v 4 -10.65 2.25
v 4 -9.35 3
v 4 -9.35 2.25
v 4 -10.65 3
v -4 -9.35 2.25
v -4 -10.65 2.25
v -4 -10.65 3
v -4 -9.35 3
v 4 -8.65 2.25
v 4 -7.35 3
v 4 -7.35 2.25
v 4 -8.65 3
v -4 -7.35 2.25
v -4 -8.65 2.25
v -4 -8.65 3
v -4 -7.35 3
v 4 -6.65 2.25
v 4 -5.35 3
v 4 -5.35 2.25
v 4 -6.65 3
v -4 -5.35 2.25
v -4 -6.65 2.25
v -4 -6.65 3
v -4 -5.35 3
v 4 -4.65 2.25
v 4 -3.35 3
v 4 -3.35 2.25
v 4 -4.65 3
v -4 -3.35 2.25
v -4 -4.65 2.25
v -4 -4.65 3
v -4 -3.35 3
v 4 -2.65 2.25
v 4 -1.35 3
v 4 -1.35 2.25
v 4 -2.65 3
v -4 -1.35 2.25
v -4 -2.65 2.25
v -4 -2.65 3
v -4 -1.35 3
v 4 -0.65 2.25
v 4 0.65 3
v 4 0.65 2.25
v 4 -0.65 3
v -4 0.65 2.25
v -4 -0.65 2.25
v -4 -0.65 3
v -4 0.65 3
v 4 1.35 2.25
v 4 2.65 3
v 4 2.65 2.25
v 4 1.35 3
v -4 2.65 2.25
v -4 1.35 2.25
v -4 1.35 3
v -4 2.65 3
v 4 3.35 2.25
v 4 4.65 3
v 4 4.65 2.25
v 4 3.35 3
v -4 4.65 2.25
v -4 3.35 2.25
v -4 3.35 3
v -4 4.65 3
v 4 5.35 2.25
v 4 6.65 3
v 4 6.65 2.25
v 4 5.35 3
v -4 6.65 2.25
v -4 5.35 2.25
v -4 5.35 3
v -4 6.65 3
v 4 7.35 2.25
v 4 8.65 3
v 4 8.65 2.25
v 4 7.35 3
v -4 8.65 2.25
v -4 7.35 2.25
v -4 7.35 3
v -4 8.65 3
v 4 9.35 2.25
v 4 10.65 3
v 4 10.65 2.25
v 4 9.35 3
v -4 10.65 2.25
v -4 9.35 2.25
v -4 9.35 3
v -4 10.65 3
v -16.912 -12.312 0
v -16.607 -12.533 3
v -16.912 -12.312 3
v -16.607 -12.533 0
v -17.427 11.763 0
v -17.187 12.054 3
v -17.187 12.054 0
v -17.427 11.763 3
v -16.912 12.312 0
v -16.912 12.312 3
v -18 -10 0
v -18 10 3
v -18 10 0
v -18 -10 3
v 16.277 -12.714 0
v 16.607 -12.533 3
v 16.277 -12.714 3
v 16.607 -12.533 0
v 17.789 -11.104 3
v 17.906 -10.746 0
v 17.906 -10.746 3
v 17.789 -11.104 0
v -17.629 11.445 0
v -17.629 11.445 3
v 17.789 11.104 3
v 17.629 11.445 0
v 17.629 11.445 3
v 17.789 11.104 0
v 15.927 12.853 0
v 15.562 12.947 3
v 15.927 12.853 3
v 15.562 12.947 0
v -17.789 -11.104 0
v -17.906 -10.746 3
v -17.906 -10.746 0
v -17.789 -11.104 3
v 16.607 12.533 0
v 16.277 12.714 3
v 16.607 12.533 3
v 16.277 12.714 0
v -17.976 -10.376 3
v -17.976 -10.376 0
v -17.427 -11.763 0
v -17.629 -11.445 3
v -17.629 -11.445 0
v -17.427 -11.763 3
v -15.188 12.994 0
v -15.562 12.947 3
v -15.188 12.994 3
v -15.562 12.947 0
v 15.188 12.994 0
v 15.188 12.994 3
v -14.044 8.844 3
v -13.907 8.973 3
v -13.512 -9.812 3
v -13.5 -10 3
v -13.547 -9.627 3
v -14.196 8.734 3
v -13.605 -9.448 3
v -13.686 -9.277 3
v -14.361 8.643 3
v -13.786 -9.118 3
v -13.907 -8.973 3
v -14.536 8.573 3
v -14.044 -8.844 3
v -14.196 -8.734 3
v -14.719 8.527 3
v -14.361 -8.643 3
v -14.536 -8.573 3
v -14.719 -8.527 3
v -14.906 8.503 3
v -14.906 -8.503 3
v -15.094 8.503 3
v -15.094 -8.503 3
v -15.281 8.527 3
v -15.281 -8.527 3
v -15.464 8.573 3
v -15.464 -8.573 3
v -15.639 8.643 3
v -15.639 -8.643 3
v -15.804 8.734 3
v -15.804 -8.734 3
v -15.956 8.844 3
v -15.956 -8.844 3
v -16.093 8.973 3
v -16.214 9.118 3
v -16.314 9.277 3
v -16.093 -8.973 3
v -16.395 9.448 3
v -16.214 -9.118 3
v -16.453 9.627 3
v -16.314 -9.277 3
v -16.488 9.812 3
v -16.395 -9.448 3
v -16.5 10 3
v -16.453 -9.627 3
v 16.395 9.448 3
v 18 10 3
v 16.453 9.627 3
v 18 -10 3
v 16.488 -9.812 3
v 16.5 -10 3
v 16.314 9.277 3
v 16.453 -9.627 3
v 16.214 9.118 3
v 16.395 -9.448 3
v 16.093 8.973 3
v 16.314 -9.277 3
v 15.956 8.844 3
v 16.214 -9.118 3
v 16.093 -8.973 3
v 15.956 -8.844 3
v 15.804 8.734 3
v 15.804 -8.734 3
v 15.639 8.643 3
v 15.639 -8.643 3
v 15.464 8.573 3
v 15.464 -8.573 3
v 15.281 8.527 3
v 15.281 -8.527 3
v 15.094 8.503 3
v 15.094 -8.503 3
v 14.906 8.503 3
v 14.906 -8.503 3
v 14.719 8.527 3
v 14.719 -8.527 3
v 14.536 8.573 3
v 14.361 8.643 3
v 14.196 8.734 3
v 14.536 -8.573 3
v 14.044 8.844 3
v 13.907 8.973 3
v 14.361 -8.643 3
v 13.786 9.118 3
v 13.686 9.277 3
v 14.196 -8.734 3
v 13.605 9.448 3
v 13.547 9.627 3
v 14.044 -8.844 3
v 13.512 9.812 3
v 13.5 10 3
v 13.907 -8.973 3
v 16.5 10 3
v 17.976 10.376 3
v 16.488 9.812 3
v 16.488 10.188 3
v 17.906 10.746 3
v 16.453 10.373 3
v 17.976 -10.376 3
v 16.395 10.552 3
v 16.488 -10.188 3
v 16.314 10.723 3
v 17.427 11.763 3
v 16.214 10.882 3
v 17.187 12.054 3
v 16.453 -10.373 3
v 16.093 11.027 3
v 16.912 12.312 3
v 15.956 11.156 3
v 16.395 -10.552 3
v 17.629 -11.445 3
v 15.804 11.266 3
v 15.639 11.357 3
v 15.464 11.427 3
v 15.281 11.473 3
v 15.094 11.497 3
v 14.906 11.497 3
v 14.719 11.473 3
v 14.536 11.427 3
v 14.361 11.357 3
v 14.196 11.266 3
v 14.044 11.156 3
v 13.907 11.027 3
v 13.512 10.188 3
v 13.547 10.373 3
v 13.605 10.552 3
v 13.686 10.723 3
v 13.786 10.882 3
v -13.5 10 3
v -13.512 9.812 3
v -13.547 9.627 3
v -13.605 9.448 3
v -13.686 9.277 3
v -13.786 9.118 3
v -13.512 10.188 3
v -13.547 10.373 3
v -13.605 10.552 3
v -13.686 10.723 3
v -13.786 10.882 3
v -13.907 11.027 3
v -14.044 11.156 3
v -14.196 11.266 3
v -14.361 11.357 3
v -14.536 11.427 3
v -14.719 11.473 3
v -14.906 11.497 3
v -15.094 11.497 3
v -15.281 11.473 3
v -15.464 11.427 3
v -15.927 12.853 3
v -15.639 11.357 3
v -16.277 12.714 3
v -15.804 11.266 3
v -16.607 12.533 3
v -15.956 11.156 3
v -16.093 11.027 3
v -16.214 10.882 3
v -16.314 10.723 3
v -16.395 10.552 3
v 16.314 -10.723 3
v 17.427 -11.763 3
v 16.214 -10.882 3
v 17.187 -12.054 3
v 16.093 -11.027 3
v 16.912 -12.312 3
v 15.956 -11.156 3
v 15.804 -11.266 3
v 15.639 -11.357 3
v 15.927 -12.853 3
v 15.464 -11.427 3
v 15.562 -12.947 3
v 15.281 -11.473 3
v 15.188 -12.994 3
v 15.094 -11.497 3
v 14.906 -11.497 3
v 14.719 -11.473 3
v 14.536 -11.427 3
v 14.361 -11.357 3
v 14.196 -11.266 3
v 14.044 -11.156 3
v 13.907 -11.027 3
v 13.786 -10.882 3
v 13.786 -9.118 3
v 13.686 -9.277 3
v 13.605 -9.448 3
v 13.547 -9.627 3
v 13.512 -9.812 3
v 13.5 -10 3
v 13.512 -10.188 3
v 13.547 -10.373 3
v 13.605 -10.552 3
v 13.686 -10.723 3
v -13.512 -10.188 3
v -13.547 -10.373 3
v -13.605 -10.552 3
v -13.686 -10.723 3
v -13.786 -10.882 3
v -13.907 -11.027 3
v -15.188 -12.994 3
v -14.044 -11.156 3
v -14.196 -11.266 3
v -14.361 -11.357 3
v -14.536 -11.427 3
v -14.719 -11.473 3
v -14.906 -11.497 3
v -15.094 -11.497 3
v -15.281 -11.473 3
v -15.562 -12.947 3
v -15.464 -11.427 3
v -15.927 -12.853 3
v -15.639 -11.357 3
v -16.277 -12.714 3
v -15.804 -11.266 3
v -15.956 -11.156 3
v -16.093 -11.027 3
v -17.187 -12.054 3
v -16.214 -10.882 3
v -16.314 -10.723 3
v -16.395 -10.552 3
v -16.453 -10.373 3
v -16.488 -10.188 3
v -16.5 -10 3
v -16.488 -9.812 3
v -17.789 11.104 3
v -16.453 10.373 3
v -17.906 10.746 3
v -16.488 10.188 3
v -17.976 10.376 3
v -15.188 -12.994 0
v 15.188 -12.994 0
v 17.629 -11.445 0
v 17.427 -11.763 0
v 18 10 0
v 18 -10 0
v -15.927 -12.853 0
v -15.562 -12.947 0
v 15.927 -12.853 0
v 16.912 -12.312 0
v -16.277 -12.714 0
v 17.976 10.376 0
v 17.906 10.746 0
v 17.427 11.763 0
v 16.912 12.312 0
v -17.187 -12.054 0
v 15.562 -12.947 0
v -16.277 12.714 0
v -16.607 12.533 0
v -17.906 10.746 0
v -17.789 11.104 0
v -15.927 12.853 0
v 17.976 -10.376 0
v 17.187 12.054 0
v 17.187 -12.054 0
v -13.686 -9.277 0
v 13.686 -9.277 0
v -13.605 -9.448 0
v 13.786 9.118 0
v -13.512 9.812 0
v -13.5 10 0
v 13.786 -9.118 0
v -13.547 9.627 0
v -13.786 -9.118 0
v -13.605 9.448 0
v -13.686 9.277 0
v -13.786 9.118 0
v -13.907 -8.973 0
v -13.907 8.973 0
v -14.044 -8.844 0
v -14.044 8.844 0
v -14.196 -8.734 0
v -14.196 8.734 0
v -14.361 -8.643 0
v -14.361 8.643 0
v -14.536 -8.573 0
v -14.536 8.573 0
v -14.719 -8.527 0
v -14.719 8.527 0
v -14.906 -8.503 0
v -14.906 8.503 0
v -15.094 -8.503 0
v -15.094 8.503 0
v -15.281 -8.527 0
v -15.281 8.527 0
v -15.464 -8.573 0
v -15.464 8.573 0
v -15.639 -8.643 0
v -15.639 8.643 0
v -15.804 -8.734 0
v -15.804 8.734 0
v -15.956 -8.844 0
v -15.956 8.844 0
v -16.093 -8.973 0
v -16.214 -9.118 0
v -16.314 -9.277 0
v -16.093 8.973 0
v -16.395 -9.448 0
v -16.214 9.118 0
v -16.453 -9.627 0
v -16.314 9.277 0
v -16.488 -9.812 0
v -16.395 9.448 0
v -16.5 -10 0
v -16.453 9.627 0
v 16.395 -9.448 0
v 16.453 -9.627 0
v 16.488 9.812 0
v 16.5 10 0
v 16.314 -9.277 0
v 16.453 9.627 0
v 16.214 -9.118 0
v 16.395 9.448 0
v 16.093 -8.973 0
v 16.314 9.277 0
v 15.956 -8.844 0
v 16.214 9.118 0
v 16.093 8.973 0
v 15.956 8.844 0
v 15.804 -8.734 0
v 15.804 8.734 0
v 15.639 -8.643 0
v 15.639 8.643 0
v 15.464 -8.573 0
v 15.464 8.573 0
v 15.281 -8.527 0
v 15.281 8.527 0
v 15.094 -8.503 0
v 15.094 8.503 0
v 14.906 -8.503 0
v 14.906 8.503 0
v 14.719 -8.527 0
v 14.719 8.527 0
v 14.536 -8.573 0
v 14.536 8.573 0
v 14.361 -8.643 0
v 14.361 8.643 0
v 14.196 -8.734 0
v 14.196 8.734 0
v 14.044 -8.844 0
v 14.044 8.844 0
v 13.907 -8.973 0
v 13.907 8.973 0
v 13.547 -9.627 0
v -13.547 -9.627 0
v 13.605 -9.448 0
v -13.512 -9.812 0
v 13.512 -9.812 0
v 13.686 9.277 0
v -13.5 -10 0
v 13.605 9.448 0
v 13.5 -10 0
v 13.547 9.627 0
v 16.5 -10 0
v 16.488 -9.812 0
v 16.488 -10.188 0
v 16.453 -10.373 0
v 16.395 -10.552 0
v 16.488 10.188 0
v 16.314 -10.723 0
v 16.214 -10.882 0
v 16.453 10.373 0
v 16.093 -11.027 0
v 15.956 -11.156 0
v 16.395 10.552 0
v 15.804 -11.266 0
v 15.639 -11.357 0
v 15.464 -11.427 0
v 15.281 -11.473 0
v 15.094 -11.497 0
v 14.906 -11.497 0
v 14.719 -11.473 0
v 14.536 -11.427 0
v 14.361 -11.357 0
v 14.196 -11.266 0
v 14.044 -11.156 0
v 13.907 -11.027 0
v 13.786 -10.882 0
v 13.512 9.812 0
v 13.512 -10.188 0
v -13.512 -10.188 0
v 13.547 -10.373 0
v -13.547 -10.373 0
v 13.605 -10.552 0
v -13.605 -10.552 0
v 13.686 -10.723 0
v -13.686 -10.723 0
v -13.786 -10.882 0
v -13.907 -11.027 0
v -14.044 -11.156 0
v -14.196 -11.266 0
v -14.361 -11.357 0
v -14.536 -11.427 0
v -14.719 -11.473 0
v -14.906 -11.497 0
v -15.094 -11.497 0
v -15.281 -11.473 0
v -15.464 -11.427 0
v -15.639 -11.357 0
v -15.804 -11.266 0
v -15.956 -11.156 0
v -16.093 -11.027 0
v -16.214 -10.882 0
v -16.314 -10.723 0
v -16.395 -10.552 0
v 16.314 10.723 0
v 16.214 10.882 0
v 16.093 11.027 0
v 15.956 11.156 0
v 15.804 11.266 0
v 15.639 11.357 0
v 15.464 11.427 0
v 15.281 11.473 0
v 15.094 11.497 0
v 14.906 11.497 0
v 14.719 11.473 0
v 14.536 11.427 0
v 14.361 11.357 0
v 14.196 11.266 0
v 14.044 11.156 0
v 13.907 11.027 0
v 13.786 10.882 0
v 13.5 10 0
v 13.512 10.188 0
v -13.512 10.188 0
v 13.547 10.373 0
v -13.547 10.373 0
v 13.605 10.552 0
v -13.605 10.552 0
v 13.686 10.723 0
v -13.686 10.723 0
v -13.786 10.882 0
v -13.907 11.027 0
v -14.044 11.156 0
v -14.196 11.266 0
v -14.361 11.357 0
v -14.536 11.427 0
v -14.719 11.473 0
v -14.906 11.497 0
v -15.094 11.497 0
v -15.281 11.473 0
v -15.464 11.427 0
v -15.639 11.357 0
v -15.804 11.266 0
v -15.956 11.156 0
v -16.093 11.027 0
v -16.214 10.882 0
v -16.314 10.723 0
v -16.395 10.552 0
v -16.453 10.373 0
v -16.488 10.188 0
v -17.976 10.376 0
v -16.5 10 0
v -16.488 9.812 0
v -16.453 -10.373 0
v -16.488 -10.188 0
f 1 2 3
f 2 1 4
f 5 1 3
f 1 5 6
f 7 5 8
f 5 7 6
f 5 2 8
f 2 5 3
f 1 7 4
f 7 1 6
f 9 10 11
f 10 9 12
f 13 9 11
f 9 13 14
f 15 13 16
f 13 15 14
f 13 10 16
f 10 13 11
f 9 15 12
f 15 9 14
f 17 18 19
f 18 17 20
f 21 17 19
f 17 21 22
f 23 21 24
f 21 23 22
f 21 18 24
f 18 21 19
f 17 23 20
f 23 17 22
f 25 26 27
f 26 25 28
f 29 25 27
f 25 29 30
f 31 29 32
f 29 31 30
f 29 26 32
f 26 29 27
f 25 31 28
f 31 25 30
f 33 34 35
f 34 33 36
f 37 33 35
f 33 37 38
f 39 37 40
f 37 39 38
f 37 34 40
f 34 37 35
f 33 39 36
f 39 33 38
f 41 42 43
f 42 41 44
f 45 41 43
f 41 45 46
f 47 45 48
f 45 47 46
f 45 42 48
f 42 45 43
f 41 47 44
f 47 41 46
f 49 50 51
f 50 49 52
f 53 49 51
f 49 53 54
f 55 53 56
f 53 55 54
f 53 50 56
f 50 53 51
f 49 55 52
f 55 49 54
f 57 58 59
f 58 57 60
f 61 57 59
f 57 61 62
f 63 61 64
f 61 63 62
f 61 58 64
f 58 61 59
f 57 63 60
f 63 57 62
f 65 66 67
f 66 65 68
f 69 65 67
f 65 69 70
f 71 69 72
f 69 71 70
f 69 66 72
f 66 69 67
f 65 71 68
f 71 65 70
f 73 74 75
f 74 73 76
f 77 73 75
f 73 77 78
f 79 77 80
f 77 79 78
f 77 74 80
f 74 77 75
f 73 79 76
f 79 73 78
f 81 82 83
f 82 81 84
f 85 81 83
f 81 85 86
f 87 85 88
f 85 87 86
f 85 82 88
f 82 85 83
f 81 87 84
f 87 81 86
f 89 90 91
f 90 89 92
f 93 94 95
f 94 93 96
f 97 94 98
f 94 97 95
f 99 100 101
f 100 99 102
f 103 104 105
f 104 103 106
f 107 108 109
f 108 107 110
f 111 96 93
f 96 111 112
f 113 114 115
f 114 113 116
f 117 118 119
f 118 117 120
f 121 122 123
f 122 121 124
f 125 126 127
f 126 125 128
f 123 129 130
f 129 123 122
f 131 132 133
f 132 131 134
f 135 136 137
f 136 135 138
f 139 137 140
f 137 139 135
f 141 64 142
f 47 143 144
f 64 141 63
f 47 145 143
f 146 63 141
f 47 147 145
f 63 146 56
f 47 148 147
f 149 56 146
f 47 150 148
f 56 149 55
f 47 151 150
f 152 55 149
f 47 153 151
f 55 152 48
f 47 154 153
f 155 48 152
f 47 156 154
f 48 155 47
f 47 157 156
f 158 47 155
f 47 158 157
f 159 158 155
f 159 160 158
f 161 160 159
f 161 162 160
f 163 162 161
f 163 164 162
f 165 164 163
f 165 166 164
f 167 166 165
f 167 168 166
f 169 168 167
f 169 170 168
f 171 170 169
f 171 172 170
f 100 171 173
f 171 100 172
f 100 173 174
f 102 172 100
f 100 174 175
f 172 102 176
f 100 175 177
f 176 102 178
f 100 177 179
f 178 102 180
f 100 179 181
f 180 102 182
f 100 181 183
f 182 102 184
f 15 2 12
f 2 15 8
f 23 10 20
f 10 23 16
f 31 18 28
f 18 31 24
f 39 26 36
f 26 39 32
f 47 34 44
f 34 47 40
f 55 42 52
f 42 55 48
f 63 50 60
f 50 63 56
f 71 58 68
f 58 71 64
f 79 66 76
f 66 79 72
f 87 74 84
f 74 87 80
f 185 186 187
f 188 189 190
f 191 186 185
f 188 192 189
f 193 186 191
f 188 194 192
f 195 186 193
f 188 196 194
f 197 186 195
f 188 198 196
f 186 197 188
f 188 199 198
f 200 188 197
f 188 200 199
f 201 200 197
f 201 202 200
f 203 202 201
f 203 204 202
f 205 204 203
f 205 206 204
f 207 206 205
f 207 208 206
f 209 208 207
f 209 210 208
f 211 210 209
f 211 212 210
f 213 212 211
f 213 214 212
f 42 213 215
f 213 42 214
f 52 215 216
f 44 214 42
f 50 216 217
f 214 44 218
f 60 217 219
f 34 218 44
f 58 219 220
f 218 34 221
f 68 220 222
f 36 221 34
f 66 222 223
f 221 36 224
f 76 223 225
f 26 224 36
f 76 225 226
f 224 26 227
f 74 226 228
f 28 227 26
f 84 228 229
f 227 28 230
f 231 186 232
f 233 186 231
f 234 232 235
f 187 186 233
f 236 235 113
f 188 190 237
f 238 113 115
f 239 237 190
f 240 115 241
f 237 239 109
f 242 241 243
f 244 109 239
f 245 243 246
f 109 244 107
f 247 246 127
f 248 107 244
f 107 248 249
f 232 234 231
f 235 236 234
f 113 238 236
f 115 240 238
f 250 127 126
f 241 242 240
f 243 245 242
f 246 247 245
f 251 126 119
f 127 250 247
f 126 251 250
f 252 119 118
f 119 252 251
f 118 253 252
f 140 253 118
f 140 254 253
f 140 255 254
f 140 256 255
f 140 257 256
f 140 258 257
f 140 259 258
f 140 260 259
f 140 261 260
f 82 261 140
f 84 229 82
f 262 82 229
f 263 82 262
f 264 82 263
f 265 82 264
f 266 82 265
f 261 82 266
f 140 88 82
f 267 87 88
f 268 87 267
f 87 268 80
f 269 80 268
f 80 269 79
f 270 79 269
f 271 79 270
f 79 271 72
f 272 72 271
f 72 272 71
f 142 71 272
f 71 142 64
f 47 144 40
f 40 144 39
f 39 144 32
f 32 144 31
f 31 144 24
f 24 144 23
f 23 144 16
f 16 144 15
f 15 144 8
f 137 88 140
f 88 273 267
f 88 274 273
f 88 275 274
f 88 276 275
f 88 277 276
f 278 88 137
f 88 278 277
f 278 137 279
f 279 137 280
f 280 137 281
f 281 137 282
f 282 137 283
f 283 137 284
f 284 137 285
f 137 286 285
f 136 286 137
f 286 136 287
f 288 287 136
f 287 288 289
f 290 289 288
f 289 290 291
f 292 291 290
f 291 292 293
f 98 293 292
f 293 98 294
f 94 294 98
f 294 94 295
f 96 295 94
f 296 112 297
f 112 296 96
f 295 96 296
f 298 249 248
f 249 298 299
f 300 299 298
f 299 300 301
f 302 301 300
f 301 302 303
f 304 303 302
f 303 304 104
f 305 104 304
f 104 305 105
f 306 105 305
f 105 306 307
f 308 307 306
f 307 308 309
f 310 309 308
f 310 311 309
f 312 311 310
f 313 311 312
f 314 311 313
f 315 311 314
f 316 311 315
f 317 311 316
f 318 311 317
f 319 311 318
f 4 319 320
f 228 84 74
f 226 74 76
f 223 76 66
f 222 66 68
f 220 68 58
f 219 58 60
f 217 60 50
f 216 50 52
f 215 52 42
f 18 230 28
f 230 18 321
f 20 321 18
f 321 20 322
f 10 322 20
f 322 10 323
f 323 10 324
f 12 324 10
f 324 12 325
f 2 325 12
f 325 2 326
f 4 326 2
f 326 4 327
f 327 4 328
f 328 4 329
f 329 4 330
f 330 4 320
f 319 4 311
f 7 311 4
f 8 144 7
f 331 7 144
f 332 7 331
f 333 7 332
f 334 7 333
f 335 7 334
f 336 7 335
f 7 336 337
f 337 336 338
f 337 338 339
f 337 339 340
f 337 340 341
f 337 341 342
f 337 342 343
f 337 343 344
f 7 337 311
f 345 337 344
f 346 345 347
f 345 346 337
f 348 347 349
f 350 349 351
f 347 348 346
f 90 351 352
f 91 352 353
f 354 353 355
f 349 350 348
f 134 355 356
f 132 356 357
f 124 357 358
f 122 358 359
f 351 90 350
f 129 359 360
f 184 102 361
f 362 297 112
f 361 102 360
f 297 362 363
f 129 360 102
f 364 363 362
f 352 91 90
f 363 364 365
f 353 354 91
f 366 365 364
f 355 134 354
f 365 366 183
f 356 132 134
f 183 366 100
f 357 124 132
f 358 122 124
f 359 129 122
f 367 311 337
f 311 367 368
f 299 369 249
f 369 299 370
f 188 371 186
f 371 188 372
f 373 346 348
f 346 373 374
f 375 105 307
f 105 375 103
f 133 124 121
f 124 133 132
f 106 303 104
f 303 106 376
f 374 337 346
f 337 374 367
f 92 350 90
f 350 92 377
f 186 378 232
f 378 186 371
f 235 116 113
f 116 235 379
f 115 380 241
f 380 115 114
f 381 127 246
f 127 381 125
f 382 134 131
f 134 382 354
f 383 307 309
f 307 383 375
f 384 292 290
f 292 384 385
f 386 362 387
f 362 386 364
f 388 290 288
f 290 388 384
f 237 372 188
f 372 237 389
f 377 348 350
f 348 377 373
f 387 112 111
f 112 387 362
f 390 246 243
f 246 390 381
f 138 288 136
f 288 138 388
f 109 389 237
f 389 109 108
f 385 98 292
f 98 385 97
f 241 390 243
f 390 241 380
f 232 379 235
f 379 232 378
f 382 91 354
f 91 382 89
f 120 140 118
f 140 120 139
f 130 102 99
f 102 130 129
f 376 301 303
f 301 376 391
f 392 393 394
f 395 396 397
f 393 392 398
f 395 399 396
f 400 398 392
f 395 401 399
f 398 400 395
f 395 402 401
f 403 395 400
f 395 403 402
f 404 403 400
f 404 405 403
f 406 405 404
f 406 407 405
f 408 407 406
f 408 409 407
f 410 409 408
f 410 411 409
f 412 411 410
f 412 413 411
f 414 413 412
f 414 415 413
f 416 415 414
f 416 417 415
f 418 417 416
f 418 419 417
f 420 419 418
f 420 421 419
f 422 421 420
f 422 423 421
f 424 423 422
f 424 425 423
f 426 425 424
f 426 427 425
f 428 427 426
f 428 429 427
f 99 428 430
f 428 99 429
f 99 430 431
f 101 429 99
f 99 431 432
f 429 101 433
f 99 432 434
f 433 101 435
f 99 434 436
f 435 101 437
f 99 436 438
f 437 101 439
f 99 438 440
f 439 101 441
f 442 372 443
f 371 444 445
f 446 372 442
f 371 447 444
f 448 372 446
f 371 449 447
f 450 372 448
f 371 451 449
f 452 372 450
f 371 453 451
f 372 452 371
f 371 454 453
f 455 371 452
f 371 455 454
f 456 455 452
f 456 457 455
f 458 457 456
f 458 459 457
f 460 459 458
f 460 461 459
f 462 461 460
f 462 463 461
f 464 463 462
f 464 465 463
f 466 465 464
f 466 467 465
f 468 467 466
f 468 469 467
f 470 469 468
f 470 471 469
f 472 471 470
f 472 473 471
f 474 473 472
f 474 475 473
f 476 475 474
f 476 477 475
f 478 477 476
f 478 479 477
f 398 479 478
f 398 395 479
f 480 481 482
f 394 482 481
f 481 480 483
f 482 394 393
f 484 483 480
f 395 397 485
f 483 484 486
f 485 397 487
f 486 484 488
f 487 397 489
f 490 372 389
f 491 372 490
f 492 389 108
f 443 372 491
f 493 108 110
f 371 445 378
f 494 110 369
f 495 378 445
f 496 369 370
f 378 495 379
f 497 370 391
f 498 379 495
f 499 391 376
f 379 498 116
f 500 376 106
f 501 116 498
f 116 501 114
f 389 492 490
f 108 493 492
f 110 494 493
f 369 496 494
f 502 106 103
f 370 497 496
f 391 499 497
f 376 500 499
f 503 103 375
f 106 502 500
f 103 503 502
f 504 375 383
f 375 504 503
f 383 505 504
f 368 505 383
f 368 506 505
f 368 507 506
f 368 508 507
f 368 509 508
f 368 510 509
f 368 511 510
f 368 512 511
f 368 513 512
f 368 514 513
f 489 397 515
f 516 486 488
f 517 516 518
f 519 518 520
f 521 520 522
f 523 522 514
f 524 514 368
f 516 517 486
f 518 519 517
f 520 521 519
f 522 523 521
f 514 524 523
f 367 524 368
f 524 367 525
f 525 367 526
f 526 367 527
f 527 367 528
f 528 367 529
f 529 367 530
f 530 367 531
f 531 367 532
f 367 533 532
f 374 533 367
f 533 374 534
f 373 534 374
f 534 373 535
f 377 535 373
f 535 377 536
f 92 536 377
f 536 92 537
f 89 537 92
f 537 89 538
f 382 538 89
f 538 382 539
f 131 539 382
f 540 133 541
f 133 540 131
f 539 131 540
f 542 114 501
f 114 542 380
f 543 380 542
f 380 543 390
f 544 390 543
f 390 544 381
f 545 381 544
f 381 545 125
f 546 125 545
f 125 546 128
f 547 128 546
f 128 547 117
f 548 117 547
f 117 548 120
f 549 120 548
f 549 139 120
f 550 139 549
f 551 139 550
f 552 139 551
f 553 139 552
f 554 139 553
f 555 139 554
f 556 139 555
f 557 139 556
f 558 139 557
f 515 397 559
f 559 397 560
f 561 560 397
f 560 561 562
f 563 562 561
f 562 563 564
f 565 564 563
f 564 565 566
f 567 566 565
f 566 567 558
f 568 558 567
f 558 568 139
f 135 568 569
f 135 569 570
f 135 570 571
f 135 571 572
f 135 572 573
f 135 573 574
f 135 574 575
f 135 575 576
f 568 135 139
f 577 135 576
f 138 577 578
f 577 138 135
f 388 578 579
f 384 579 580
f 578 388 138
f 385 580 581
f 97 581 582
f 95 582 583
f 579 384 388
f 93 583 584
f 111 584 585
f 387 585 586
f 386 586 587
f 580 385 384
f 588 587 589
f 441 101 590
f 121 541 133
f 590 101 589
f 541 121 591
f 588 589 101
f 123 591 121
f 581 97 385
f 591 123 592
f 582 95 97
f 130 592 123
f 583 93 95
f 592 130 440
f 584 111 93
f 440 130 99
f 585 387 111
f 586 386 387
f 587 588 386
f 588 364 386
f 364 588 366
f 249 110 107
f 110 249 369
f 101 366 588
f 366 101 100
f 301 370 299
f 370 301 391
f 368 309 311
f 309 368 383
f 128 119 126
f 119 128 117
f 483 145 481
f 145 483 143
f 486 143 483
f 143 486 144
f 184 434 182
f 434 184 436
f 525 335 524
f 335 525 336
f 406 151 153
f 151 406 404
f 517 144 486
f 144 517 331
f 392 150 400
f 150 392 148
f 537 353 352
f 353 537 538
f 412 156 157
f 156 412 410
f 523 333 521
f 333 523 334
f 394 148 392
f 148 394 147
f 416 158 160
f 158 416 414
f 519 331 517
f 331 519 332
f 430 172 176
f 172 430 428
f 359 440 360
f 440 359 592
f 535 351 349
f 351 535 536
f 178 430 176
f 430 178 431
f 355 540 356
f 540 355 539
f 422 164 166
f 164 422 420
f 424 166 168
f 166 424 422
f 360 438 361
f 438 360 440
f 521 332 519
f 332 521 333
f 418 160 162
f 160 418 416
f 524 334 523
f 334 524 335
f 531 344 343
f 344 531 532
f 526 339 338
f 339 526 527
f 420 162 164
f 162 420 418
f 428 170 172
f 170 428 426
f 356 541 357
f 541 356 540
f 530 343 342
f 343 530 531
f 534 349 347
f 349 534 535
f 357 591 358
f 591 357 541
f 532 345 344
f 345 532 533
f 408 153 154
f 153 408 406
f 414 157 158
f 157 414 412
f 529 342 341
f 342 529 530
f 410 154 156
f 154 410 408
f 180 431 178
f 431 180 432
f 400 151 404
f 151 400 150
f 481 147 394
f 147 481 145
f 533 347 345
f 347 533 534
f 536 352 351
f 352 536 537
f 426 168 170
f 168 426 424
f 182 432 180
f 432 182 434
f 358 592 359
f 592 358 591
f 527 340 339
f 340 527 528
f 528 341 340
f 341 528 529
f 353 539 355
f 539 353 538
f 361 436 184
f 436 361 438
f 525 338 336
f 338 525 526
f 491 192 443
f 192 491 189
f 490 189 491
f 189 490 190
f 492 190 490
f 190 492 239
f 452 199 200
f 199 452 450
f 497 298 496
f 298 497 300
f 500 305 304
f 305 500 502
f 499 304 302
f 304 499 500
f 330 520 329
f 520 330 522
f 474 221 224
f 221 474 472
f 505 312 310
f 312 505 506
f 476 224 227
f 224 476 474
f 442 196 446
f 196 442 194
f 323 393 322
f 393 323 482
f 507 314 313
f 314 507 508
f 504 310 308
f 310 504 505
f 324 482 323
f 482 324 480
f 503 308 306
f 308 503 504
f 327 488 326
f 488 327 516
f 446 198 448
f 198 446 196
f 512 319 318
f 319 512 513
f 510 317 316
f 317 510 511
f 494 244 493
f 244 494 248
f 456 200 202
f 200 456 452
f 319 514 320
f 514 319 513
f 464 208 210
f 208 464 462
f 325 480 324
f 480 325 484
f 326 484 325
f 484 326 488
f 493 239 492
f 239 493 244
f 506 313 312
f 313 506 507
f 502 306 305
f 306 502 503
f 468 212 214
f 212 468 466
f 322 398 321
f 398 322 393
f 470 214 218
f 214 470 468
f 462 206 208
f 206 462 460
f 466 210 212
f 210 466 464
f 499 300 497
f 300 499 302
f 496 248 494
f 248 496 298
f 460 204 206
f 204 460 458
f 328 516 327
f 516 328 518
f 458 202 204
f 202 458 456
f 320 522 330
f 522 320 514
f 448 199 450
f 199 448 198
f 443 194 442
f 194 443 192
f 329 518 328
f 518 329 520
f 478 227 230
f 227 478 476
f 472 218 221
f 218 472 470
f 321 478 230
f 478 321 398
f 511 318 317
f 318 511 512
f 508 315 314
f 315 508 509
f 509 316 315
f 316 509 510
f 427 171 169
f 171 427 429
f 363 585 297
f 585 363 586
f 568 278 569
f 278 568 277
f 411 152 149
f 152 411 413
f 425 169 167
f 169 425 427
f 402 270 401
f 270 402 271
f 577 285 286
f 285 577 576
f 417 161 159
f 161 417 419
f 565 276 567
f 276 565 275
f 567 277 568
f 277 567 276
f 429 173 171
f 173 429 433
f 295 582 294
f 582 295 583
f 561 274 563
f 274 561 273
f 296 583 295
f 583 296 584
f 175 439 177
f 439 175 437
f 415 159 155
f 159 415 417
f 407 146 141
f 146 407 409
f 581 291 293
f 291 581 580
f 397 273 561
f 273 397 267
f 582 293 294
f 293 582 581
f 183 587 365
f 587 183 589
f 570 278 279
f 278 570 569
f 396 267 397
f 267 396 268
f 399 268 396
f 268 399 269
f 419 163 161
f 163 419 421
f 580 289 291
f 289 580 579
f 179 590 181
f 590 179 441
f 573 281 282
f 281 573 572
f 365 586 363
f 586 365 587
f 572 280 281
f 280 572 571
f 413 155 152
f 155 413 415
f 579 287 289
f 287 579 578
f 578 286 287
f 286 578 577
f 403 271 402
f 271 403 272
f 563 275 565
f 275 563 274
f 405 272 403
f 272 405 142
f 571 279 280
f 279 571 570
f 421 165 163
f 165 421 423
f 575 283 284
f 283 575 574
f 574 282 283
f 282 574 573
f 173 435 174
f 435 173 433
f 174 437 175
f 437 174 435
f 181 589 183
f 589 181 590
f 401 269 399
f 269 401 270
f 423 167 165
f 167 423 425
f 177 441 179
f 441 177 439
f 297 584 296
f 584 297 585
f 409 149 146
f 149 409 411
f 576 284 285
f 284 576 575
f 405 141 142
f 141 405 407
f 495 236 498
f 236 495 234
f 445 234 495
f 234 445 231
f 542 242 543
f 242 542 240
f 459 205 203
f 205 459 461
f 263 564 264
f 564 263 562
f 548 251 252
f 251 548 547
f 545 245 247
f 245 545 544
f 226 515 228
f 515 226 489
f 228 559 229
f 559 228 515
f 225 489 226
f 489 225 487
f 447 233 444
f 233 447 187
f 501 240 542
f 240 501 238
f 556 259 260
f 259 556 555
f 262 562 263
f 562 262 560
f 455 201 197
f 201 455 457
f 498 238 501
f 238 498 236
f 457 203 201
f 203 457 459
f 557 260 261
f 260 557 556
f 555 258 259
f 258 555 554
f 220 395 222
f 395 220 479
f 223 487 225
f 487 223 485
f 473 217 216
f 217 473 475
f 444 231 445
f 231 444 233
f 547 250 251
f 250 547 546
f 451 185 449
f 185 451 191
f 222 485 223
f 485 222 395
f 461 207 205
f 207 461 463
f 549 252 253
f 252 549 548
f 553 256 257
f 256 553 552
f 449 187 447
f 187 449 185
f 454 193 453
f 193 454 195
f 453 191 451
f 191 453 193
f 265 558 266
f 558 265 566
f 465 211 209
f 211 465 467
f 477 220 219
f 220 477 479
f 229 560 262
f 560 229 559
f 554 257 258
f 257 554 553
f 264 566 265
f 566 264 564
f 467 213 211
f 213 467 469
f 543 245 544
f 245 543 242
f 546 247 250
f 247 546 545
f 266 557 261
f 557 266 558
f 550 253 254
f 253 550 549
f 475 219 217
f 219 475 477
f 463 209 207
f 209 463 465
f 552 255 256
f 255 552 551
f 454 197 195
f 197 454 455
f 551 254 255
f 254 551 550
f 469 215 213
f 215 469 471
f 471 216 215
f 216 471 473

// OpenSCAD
clamp_height = 3;
clamp_width = 20;
clamp_length = 30;
rounded = 3;
belt_pitch = 2;
belt_width = 8;
tooth_width = 1.3;
tooth_heigth = .75;
//offset = belt_pitch/4;
offset = 0;
screw_offset = 2;
m3_diameter = 3;

module beltclamp(){
	difference(){
		// basic shape
		hull(){
			translate([clamp_length/2, clamp_width/2, 0]) cylinder(r=rounded,h=clamp_height, $fn=50);
			translate([clamp_length/2, -clamp_width/2, 0]) cylinder(r=rounded,h=clamp_height, $fn=50);
			translate([-clamp_length/2, clamp_width/2, 0]) cylinder(r=rounded,h=clamp_height, $fn=50);
			translate([-clamp_length/2, -clamp_width/2, 0]) cylinder(r=rounded,h=clamp_height, $fn=50);
			}
		// screw holes
		translate(v = [-clamp_length/2, -clamp_width/2, -1]) cylinder(d=m3_diameter, h=clamp_height+2, $fn=50);
		translate(v = [clamp_length/2, -clamp_width/2, -1]) cylinder(d=m3_diameter, h=clamp_height+2, $fn=50);
		translate(v = [-clamp_length/2, +clamp_width/2, -1]) cylinder(d=m3_diameter, h=clamp_height+2, $fn=50);
		translate(v = [clamp_length/2, +clamp_width/2, -1]) cylinder(d=m3_diameter, h=clamp_height+2, $fn=50);
		// belt grip
		translate(v = [0,offset,clamp_height-tooth_heigth])
		for ( i = [round(-clamp_width/belt_pitch/2) : round(clamp_width/belt_pitch/2)]){
			translate(v = [0,belt_pitch*i,tooth_heigth])cube(size = [belt_width, tooth_width, tooth_heigth*2], center = true);
		}
	}

}

beltclamp();
